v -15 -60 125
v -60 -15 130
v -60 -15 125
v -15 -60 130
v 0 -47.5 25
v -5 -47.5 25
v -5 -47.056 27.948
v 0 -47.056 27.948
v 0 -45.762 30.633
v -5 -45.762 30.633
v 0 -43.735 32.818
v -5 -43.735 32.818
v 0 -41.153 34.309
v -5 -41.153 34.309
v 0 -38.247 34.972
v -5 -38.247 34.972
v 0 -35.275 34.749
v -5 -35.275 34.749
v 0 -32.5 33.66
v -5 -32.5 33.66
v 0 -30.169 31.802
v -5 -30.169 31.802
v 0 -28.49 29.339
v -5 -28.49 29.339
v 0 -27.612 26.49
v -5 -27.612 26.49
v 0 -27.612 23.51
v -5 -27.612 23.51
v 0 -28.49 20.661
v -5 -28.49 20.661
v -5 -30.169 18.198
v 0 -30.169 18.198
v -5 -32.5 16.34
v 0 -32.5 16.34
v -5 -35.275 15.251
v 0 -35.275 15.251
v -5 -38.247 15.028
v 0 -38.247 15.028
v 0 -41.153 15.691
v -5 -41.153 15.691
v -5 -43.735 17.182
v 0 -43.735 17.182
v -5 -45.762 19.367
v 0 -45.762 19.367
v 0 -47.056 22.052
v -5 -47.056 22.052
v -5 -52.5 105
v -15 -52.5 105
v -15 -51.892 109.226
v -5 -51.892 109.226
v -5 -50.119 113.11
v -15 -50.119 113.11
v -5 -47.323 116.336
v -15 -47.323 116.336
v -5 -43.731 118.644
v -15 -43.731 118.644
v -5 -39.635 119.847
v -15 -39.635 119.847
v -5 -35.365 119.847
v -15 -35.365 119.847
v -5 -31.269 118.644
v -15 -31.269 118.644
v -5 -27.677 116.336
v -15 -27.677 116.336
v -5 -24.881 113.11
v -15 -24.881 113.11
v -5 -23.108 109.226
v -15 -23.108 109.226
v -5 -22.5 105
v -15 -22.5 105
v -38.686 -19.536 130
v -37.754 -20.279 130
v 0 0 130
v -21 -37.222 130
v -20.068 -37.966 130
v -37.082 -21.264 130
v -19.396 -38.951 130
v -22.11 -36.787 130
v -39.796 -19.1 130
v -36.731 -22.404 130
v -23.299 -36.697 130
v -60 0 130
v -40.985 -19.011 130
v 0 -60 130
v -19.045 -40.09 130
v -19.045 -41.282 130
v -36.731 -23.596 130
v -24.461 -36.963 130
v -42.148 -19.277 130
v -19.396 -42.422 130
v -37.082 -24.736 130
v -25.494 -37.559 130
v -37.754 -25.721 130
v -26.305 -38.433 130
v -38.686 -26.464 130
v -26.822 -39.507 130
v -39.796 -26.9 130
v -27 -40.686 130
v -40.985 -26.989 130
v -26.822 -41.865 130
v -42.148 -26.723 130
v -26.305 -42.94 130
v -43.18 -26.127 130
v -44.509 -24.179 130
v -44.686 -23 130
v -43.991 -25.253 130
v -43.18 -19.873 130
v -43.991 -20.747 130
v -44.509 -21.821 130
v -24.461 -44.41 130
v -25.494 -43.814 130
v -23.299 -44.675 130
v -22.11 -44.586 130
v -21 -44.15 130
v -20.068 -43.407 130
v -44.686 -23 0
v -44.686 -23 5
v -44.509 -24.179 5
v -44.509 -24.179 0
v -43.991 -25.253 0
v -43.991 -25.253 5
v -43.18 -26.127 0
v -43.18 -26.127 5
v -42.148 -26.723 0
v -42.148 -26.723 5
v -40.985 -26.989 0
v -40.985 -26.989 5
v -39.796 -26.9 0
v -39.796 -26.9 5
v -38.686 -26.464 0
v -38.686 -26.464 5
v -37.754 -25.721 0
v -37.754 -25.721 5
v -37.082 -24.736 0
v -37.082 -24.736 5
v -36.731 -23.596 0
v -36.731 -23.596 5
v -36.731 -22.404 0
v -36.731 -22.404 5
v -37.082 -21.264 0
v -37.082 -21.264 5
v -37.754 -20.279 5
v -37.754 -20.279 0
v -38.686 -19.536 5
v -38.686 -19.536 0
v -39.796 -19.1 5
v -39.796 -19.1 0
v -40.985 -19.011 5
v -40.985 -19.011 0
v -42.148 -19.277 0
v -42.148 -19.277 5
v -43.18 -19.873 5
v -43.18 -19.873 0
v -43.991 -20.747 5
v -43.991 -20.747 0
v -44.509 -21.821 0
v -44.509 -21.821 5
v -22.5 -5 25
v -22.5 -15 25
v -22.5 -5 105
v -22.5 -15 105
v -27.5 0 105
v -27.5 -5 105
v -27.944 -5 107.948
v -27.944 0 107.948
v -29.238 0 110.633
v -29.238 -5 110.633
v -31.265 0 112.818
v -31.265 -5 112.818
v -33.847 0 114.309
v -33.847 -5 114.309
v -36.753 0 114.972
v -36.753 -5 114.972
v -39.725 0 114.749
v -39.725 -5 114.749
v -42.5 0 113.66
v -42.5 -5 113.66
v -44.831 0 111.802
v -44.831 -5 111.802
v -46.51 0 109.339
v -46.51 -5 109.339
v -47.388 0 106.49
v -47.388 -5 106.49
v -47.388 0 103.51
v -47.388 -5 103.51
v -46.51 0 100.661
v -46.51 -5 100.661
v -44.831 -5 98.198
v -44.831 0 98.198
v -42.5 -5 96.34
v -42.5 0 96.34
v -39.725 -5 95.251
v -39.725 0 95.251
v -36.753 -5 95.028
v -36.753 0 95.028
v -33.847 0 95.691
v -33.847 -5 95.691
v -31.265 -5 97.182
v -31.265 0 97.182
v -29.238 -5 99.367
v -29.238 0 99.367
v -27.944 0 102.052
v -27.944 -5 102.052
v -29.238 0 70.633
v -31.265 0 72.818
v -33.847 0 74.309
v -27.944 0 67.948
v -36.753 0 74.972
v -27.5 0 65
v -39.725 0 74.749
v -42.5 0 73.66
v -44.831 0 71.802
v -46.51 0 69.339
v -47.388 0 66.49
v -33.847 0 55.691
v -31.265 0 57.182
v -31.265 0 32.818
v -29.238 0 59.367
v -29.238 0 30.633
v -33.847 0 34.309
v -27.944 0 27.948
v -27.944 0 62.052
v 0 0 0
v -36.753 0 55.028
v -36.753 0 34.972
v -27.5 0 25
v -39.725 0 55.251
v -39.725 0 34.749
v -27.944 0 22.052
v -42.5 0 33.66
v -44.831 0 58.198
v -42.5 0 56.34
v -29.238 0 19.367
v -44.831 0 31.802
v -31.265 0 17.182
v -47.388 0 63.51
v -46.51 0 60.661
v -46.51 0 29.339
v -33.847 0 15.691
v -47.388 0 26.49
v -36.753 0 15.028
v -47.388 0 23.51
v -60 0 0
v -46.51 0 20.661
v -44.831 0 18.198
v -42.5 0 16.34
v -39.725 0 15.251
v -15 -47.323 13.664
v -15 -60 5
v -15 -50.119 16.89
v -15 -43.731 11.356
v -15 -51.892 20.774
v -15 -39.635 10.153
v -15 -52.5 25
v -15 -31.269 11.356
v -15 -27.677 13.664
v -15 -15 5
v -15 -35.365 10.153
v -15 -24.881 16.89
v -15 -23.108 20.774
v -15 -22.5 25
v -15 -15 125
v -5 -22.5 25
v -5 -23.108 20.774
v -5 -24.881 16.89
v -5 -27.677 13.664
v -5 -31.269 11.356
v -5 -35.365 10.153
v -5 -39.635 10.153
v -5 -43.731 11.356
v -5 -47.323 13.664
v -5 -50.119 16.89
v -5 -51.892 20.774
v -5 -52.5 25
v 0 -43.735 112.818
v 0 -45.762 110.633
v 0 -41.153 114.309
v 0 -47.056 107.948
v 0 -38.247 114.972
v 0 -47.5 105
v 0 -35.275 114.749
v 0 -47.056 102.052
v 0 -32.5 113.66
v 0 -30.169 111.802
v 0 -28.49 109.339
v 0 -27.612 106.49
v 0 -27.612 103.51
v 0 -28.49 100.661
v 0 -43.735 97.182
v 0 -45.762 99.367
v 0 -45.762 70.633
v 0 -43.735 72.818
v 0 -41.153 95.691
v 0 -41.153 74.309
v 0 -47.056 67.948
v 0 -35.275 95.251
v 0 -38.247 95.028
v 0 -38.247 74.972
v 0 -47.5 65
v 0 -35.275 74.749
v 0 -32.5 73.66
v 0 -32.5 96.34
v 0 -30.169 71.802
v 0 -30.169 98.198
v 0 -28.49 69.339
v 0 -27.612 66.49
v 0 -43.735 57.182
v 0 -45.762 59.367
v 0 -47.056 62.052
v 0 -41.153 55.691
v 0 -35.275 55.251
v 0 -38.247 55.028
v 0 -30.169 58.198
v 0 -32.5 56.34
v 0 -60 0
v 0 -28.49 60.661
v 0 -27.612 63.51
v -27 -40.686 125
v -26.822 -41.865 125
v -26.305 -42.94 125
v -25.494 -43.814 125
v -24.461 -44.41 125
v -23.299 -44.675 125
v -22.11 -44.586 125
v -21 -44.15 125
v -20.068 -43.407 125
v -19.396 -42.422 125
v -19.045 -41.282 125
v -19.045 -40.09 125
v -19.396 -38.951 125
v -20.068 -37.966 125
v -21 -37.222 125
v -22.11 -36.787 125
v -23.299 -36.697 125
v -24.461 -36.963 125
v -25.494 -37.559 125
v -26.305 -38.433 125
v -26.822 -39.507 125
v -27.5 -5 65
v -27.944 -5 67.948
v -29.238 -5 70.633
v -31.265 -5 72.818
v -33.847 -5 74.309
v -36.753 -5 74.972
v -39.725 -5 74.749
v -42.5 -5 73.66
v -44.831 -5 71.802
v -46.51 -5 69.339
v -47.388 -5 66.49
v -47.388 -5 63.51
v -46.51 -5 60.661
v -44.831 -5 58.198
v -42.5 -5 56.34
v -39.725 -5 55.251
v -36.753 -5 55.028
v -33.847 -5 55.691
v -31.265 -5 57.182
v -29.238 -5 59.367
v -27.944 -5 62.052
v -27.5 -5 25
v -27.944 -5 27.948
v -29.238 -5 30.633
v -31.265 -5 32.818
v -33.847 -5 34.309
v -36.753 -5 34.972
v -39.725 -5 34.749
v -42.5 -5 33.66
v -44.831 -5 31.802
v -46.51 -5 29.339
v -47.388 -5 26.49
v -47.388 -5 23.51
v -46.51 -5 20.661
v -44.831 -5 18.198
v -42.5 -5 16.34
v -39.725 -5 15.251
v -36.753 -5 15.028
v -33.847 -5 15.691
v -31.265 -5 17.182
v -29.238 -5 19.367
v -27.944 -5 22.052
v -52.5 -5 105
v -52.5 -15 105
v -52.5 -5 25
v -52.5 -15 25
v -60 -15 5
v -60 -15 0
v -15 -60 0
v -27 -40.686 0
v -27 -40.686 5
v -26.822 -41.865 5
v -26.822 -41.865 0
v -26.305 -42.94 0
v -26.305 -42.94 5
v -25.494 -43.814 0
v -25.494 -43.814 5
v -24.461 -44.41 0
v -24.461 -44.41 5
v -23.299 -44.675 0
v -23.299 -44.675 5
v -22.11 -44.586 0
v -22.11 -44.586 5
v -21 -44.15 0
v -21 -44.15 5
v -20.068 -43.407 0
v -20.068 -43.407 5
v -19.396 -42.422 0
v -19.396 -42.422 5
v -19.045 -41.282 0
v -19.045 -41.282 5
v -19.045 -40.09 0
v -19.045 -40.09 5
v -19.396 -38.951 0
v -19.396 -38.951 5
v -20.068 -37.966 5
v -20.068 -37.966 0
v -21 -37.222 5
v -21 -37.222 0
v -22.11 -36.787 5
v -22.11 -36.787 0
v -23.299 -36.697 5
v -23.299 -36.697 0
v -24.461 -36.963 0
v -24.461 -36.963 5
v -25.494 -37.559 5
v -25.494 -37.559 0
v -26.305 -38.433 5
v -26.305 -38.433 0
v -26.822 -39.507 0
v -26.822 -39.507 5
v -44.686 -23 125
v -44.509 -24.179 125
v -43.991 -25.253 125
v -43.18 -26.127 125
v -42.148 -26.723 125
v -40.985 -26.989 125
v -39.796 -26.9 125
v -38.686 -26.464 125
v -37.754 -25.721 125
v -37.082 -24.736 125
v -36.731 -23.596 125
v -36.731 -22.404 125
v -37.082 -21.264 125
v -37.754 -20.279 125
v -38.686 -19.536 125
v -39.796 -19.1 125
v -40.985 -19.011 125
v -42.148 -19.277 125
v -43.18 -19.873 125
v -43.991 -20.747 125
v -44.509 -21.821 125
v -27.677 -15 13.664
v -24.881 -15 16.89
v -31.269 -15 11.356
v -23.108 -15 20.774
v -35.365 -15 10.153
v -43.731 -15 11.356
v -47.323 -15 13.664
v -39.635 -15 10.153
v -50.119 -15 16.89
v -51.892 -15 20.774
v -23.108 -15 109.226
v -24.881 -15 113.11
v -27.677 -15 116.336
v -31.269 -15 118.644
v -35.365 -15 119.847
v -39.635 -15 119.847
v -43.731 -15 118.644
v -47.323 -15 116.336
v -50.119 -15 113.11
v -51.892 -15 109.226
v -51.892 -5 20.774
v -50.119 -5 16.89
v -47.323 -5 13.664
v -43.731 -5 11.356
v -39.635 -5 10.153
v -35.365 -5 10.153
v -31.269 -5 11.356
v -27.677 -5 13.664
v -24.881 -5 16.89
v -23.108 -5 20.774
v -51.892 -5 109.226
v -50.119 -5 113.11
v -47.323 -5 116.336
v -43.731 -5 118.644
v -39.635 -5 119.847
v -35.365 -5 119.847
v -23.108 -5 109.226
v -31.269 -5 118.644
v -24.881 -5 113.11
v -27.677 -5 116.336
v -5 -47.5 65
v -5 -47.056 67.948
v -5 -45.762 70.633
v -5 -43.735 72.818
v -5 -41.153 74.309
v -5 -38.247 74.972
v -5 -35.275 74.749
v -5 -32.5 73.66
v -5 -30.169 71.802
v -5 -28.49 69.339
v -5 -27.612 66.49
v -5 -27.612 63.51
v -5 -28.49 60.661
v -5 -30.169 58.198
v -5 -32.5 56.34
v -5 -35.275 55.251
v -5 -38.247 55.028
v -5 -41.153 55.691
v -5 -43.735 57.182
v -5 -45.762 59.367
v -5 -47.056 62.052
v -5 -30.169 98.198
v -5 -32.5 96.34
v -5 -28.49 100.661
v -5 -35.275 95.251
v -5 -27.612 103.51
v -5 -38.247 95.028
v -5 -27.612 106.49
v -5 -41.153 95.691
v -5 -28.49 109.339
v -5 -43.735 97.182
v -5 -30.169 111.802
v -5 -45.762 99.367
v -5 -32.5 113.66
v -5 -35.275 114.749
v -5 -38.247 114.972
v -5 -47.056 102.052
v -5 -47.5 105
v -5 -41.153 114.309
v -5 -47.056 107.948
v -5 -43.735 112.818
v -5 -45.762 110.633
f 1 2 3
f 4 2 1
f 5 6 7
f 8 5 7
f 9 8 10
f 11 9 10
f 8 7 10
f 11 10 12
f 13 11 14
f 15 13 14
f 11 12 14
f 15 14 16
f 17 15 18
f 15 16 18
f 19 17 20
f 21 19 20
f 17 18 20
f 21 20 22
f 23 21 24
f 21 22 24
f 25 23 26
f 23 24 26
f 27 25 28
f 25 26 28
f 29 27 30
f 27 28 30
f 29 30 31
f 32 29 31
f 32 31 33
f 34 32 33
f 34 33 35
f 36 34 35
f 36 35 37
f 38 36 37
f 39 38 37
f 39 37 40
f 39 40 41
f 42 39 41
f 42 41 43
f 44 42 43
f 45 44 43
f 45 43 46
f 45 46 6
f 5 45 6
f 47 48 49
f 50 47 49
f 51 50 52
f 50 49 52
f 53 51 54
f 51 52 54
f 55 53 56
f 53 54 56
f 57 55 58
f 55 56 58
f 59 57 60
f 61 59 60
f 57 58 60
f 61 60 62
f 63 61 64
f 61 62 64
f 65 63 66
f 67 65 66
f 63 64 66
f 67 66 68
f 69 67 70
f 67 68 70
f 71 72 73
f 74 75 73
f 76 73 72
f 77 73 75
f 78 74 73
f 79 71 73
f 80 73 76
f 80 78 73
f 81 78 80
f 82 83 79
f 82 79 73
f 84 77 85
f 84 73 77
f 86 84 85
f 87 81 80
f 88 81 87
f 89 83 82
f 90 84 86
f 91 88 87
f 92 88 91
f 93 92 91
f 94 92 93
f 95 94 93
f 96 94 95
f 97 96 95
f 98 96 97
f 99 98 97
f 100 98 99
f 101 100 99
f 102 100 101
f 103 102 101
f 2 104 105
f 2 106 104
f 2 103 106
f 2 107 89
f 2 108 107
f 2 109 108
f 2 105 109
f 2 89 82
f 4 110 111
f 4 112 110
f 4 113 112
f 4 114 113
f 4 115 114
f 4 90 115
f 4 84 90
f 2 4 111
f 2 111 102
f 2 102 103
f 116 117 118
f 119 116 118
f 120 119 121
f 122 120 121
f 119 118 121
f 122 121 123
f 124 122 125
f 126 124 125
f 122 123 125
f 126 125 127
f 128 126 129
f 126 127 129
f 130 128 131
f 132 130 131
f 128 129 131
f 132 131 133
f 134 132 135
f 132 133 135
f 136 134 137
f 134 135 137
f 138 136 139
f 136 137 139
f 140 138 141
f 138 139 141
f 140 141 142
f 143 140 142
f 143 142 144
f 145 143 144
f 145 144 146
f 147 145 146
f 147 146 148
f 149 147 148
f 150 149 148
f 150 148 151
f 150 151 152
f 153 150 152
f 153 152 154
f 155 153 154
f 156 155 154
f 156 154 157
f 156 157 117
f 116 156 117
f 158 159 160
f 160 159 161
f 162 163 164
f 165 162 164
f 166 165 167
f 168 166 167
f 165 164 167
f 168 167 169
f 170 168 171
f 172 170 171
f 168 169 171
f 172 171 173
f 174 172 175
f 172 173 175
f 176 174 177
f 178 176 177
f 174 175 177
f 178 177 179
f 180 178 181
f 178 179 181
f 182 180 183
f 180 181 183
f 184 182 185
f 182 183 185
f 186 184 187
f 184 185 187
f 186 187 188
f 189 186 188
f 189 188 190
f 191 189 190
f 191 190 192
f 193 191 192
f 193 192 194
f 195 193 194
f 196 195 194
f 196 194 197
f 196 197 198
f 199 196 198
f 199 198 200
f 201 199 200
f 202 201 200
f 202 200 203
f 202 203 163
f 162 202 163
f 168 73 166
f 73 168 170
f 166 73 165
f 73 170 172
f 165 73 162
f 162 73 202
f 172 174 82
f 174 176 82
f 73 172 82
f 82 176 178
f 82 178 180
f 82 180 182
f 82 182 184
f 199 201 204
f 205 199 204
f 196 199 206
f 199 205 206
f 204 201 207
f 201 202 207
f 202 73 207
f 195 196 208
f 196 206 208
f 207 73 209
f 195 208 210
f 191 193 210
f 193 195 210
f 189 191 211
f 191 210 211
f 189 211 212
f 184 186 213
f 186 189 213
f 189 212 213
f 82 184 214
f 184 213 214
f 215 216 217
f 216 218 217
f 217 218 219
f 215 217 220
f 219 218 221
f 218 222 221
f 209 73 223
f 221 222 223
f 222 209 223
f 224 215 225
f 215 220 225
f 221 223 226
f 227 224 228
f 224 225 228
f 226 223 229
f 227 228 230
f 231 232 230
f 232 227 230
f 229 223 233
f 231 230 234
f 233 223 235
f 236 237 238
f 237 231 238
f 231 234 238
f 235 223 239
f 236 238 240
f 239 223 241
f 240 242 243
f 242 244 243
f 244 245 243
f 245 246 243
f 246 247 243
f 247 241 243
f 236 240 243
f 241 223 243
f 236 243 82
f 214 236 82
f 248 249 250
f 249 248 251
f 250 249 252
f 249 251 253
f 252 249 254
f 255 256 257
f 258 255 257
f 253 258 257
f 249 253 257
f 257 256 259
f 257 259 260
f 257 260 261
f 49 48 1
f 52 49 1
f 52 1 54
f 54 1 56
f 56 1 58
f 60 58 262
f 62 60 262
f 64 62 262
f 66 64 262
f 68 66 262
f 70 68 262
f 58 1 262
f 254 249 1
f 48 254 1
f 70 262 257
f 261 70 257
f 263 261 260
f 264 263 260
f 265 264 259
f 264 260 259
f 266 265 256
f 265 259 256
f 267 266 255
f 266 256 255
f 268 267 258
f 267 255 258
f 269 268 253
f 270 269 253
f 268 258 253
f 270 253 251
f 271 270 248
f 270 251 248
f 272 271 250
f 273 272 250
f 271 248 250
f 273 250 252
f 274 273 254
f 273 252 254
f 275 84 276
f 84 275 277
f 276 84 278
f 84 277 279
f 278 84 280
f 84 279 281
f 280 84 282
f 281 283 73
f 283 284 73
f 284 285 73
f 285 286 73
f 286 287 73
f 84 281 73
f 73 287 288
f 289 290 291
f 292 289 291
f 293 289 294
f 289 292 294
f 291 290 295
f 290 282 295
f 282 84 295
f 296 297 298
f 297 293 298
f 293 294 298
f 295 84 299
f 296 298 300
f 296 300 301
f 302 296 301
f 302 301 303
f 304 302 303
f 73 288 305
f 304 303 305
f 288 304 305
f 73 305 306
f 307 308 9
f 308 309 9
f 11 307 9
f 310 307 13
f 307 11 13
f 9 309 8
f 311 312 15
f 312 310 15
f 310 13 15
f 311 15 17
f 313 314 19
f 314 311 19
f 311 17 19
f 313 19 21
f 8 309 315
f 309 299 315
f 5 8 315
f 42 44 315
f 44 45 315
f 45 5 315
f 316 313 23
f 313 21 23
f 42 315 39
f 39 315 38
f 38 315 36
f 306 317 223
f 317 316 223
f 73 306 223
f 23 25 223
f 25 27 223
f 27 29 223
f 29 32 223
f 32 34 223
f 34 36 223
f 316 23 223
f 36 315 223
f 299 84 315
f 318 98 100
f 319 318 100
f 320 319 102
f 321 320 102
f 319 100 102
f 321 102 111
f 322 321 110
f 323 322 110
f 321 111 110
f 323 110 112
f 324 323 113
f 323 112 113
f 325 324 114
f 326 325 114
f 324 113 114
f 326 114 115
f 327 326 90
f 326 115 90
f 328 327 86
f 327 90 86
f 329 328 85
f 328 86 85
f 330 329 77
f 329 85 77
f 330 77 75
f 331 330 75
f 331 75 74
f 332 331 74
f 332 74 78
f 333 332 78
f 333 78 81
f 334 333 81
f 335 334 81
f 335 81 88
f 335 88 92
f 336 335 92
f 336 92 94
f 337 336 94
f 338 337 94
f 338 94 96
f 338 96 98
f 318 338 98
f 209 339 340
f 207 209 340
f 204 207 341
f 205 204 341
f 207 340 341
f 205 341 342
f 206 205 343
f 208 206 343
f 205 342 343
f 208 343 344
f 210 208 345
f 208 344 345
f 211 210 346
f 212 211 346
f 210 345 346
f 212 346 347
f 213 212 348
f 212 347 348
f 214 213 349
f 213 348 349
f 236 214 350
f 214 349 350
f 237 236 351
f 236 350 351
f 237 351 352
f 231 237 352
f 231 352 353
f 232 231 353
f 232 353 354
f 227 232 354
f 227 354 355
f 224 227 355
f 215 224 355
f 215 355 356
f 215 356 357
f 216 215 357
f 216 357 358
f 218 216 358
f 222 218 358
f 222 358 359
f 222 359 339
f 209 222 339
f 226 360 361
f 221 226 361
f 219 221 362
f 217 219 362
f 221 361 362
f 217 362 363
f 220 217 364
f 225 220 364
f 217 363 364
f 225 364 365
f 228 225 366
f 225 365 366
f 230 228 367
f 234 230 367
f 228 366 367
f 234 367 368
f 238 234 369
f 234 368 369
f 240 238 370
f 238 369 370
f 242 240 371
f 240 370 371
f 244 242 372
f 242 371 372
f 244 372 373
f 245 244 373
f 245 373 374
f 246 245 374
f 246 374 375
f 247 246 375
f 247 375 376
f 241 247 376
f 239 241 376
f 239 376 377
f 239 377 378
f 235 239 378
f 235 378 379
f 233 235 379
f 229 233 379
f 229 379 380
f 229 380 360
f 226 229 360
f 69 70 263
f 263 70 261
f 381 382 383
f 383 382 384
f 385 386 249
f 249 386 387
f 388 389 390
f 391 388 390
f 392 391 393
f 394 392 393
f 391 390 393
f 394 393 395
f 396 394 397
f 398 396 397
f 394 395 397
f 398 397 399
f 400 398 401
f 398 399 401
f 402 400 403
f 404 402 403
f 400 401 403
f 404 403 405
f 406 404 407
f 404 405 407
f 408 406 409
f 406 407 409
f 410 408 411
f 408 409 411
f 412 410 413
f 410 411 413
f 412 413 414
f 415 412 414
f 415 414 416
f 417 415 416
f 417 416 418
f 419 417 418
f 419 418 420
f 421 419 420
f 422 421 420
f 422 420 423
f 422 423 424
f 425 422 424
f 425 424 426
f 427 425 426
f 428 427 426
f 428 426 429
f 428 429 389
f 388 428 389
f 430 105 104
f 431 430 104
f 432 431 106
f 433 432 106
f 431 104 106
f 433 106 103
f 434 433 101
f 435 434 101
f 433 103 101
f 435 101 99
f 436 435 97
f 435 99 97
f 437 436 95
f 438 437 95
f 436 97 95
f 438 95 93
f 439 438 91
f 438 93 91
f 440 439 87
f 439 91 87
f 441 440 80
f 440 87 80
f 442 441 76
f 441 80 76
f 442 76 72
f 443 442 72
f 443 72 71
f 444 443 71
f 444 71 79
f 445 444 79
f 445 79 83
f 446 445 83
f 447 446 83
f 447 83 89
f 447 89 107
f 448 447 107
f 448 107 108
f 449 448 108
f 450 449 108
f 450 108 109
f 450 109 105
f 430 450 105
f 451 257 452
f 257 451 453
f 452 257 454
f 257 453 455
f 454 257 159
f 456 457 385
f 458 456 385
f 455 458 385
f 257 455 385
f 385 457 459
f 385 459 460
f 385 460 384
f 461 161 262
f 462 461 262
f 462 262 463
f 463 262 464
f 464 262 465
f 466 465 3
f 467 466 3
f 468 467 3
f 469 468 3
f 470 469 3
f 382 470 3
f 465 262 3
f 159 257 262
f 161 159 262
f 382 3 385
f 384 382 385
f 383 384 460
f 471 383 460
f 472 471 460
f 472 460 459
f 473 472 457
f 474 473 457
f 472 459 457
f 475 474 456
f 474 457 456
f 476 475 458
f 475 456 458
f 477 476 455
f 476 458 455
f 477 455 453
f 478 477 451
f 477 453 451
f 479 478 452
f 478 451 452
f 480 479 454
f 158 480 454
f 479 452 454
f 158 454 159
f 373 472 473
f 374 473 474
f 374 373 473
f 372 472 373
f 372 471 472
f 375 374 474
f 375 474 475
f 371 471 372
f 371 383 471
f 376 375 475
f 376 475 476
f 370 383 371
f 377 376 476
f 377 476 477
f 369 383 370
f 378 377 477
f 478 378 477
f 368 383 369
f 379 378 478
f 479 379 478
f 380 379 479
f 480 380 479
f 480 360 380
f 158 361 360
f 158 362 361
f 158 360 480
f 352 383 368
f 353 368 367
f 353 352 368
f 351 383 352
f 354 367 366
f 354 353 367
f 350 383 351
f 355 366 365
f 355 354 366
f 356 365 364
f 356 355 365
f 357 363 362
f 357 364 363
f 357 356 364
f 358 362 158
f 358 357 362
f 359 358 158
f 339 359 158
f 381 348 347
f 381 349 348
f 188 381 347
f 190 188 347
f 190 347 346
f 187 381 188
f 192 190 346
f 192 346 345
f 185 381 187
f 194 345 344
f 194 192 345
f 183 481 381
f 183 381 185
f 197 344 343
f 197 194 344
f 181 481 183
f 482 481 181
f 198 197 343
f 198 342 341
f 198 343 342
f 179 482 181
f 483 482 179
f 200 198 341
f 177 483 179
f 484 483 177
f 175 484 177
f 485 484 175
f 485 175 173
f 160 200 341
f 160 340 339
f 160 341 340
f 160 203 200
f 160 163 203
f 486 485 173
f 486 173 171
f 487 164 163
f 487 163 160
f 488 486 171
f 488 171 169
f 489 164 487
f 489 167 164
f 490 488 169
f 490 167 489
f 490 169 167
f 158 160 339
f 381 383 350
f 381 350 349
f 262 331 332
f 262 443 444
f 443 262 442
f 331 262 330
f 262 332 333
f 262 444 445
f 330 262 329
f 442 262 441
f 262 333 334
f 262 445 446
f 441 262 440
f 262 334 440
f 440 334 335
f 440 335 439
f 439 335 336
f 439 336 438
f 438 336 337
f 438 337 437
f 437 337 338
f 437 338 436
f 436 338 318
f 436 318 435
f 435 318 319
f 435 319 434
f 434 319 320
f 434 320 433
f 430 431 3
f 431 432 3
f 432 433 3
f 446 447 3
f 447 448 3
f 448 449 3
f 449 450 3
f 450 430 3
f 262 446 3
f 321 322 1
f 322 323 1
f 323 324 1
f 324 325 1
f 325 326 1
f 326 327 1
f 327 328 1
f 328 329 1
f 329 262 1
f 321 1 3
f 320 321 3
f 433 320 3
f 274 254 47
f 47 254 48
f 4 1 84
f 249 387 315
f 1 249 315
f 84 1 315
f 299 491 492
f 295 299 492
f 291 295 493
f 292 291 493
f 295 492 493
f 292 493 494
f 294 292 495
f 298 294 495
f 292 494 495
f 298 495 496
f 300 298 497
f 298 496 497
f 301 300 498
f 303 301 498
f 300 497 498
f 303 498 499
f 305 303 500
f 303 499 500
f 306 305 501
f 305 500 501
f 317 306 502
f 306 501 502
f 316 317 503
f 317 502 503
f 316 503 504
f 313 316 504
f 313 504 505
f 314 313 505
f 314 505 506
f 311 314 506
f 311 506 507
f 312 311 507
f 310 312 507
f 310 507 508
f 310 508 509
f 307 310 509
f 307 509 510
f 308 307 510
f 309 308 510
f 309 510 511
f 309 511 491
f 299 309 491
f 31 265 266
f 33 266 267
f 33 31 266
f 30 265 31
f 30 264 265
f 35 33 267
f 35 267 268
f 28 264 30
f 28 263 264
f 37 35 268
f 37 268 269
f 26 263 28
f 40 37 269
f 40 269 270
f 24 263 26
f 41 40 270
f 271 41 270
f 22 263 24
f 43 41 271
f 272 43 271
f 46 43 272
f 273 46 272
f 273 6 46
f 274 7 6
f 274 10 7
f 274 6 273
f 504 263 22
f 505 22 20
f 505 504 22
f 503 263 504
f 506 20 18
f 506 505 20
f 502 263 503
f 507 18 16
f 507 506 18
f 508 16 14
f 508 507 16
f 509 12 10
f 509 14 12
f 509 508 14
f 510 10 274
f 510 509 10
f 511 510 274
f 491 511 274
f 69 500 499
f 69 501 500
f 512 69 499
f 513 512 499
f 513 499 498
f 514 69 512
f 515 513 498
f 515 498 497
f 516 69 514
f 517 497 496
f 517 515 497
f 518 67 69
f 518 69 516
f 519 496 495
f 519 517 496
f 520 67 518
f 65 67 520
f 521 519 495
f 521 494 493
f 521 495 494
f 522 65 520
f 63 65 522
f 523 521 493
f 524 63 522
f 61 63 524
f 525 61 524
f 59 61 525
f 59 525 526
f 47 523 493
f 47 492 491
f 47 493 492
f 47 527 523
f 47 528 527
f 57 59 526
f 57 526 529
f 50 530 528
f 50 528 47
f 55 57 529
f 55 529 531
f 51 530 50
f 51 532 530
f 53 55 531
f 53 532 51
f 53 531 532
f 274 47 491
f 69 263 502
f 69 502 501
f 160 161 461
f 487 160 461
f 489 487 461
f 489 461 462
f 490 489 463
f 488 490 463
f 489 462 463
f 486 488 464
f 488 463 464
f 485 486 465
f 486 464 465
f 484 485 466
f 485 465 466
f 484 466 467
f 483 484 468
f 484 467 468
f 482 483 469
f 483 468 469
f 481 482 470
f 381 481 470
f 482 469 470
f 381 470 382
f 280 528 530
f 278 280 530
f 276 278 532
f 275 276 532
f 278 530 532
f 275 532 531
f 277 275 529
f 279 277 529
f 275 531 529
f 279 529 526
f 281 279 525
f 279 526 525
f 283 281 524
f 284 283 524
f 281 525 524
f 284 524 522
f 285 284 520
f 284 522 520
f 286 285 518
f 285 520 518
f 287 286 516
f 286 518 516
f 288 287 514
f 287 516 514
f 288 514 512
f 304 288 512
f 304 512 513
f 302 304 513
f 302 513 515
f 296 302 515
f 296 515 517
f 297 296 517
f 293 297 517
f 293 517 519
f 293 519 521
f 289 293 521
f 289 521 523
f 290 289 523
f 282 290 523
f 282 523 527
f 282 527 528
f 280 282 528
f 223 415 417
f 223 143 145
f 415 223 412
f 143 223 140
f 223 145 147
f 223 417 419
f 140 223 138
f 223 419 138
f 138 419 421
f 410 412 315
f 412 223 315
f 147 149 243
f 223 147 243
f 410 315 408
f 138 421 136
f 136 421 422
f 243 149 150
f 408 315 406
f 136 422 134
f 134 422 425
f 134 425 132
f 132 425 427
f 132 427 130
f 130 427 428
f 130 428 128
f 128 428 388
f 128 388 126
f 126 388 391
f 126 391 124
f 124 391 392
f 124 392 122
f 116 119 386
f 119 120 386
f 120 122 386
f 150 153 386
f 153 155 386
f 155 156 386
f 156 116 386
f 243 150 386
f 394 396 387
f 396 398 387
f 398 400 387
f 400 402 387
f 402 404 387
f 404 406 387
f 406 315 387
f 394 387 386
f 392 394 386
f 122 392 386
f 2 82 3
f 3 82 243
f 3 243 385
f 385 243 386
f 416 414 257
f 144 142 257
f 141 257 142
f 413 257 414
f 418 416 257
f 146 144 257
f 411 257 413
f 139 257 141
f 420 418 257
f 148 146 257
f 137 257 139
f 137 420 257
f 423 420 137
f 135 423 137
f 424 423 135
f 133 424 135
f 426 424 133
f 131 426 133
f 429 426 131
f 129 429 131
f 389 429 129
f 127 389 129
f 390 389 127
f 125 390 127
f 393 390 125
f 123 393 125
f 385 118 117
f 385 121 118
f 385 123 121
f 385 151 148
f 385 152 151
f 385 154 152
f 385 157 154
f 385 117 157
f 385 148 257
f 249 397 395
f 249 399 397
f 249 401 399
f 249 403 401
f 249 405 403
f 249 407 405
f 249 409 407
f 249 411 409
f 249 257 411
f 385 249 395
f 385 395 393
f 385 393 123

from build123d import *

# Parameters (mm, degrees)
F1_DEPTH  = 130
F3_DEPTH  = 125
F6_DEPTH  = 10
F7_DEPTH  = 10
F9_DEPTH  = 5
F10_R     = 10
F11_DEPTH = 5.001
F12_R     = 10
F13_DEPTH = 5.001
F14_R     = 4
F15_DEPTH = 130.001
F16_ANGLE = 180


with BuildPart() as f1:
    # F0 (on Top) → F1 (new body)
    with BuildSketch(Plane.XY):
        Polygon((0, 60), (0, 0), (60, 0), (60, 15), (15, 60), align=None)
    extrude(amount=F1_DEPTH)

    # F2 (on face) → F3 (cut)
    with BuildSketch(Plane.XY.offset(130)):
        Polygon((15, 15), (60, 15), (15, 60), align=None)
    extrude(amount=-F3_DEPTH, mode=Mode.SUBTRACT)

    # F5 (on face) → F6 (cut)
    with BuildSketch(Plane.YZ.offset(15)):
        with BuildLine():
            Line((52.5, 25), (52.5, 105))
            ThreePointArc((52.5, 105), (37.5, 120), (22.5, 105))
            Line((22.5, 105), (22.5, 25))
            ThreePointArc((22.5, 25), (37.5, 10), (52.5, 25))
        make_face()
    extrude(amount=-F6_DEPTH, mode=Mode.SUBTRACT)

    # F4 (on face) → F7 (cut)
    with BuildSketch(Plane(origin=(0, 15, 0), x_dir=(-1, 0, 0), z_dir=(0, 1, 0))):
        with BuildLine():
            Line((-22.5, 25), (-22.5, 105))
            ThreePointArc((-22.5, 105), (-37.5, 120), (-52.5, 105))
            Line((-52.5, 105), (-52.5, 25))
            ThreePointArc((-52.5, 25), (-37.5, 10), (-22.5, 25))
        make_face()
    extrude(amount=-F7_DEPTH, mode=Mode.SUBTRACT)

    # F8 (on face) → F9 (join)
    with BuildSketch(Plane.XY.offset(130)):
        Polygon((15, 15), (60, 15), (15, 60), align=None)
    extrude(amount=-F9_DEPTH)

    # F10 (on face) → F11 (cut, through all)
    with BuildSketch(Plane(origin=(0, 5, 0), x_dir=(-1, 0, 0), z_dir=(0, 1, 0))):
        with Locations((-37.5, 105)):
            Circle(F10_R)
        with Locations((-37.5, 65)):
            Circle(F10_R)
        with Locations((-37.5, 25)):
            Circle(F10_R)
    extrude(amount=-F11_DEPTH, mode=Mode.SUBTRACT)

    # F12 (on face) → F13 (cut, through all)
    with BuildSketch(Plane.YZ.offset(5)):
        with Locations((37.5, 105)):
            Circle(F12_R)
        with Locations((37.5, 65)):
            Circle(F12_R)
        with Locations((37.5, 25)):
            Circle(F12_R)
    extrude(amount=-F13_DEPTH, mode=Mode.SUBTRACT)

    # F14 (on face) → F15 (cut, through all)
    with BuildSketch(Plane.XY.offset(130)):
        with Locations((40.686292, 23)):
            Circle(F14_R)
        with Locations((23, 40.686292)):
            Circle(F14_R)
    extrude(amount=-F15_DEPTH, mode=Mode.SUBTRACT)


with BuildPart() as f1_1:
    # F16: moved
    add(f1.part.rotate(Axis((0, 0, 65), (0, 0, 1)), F16_ANGLE))


solid = f1_1.part
